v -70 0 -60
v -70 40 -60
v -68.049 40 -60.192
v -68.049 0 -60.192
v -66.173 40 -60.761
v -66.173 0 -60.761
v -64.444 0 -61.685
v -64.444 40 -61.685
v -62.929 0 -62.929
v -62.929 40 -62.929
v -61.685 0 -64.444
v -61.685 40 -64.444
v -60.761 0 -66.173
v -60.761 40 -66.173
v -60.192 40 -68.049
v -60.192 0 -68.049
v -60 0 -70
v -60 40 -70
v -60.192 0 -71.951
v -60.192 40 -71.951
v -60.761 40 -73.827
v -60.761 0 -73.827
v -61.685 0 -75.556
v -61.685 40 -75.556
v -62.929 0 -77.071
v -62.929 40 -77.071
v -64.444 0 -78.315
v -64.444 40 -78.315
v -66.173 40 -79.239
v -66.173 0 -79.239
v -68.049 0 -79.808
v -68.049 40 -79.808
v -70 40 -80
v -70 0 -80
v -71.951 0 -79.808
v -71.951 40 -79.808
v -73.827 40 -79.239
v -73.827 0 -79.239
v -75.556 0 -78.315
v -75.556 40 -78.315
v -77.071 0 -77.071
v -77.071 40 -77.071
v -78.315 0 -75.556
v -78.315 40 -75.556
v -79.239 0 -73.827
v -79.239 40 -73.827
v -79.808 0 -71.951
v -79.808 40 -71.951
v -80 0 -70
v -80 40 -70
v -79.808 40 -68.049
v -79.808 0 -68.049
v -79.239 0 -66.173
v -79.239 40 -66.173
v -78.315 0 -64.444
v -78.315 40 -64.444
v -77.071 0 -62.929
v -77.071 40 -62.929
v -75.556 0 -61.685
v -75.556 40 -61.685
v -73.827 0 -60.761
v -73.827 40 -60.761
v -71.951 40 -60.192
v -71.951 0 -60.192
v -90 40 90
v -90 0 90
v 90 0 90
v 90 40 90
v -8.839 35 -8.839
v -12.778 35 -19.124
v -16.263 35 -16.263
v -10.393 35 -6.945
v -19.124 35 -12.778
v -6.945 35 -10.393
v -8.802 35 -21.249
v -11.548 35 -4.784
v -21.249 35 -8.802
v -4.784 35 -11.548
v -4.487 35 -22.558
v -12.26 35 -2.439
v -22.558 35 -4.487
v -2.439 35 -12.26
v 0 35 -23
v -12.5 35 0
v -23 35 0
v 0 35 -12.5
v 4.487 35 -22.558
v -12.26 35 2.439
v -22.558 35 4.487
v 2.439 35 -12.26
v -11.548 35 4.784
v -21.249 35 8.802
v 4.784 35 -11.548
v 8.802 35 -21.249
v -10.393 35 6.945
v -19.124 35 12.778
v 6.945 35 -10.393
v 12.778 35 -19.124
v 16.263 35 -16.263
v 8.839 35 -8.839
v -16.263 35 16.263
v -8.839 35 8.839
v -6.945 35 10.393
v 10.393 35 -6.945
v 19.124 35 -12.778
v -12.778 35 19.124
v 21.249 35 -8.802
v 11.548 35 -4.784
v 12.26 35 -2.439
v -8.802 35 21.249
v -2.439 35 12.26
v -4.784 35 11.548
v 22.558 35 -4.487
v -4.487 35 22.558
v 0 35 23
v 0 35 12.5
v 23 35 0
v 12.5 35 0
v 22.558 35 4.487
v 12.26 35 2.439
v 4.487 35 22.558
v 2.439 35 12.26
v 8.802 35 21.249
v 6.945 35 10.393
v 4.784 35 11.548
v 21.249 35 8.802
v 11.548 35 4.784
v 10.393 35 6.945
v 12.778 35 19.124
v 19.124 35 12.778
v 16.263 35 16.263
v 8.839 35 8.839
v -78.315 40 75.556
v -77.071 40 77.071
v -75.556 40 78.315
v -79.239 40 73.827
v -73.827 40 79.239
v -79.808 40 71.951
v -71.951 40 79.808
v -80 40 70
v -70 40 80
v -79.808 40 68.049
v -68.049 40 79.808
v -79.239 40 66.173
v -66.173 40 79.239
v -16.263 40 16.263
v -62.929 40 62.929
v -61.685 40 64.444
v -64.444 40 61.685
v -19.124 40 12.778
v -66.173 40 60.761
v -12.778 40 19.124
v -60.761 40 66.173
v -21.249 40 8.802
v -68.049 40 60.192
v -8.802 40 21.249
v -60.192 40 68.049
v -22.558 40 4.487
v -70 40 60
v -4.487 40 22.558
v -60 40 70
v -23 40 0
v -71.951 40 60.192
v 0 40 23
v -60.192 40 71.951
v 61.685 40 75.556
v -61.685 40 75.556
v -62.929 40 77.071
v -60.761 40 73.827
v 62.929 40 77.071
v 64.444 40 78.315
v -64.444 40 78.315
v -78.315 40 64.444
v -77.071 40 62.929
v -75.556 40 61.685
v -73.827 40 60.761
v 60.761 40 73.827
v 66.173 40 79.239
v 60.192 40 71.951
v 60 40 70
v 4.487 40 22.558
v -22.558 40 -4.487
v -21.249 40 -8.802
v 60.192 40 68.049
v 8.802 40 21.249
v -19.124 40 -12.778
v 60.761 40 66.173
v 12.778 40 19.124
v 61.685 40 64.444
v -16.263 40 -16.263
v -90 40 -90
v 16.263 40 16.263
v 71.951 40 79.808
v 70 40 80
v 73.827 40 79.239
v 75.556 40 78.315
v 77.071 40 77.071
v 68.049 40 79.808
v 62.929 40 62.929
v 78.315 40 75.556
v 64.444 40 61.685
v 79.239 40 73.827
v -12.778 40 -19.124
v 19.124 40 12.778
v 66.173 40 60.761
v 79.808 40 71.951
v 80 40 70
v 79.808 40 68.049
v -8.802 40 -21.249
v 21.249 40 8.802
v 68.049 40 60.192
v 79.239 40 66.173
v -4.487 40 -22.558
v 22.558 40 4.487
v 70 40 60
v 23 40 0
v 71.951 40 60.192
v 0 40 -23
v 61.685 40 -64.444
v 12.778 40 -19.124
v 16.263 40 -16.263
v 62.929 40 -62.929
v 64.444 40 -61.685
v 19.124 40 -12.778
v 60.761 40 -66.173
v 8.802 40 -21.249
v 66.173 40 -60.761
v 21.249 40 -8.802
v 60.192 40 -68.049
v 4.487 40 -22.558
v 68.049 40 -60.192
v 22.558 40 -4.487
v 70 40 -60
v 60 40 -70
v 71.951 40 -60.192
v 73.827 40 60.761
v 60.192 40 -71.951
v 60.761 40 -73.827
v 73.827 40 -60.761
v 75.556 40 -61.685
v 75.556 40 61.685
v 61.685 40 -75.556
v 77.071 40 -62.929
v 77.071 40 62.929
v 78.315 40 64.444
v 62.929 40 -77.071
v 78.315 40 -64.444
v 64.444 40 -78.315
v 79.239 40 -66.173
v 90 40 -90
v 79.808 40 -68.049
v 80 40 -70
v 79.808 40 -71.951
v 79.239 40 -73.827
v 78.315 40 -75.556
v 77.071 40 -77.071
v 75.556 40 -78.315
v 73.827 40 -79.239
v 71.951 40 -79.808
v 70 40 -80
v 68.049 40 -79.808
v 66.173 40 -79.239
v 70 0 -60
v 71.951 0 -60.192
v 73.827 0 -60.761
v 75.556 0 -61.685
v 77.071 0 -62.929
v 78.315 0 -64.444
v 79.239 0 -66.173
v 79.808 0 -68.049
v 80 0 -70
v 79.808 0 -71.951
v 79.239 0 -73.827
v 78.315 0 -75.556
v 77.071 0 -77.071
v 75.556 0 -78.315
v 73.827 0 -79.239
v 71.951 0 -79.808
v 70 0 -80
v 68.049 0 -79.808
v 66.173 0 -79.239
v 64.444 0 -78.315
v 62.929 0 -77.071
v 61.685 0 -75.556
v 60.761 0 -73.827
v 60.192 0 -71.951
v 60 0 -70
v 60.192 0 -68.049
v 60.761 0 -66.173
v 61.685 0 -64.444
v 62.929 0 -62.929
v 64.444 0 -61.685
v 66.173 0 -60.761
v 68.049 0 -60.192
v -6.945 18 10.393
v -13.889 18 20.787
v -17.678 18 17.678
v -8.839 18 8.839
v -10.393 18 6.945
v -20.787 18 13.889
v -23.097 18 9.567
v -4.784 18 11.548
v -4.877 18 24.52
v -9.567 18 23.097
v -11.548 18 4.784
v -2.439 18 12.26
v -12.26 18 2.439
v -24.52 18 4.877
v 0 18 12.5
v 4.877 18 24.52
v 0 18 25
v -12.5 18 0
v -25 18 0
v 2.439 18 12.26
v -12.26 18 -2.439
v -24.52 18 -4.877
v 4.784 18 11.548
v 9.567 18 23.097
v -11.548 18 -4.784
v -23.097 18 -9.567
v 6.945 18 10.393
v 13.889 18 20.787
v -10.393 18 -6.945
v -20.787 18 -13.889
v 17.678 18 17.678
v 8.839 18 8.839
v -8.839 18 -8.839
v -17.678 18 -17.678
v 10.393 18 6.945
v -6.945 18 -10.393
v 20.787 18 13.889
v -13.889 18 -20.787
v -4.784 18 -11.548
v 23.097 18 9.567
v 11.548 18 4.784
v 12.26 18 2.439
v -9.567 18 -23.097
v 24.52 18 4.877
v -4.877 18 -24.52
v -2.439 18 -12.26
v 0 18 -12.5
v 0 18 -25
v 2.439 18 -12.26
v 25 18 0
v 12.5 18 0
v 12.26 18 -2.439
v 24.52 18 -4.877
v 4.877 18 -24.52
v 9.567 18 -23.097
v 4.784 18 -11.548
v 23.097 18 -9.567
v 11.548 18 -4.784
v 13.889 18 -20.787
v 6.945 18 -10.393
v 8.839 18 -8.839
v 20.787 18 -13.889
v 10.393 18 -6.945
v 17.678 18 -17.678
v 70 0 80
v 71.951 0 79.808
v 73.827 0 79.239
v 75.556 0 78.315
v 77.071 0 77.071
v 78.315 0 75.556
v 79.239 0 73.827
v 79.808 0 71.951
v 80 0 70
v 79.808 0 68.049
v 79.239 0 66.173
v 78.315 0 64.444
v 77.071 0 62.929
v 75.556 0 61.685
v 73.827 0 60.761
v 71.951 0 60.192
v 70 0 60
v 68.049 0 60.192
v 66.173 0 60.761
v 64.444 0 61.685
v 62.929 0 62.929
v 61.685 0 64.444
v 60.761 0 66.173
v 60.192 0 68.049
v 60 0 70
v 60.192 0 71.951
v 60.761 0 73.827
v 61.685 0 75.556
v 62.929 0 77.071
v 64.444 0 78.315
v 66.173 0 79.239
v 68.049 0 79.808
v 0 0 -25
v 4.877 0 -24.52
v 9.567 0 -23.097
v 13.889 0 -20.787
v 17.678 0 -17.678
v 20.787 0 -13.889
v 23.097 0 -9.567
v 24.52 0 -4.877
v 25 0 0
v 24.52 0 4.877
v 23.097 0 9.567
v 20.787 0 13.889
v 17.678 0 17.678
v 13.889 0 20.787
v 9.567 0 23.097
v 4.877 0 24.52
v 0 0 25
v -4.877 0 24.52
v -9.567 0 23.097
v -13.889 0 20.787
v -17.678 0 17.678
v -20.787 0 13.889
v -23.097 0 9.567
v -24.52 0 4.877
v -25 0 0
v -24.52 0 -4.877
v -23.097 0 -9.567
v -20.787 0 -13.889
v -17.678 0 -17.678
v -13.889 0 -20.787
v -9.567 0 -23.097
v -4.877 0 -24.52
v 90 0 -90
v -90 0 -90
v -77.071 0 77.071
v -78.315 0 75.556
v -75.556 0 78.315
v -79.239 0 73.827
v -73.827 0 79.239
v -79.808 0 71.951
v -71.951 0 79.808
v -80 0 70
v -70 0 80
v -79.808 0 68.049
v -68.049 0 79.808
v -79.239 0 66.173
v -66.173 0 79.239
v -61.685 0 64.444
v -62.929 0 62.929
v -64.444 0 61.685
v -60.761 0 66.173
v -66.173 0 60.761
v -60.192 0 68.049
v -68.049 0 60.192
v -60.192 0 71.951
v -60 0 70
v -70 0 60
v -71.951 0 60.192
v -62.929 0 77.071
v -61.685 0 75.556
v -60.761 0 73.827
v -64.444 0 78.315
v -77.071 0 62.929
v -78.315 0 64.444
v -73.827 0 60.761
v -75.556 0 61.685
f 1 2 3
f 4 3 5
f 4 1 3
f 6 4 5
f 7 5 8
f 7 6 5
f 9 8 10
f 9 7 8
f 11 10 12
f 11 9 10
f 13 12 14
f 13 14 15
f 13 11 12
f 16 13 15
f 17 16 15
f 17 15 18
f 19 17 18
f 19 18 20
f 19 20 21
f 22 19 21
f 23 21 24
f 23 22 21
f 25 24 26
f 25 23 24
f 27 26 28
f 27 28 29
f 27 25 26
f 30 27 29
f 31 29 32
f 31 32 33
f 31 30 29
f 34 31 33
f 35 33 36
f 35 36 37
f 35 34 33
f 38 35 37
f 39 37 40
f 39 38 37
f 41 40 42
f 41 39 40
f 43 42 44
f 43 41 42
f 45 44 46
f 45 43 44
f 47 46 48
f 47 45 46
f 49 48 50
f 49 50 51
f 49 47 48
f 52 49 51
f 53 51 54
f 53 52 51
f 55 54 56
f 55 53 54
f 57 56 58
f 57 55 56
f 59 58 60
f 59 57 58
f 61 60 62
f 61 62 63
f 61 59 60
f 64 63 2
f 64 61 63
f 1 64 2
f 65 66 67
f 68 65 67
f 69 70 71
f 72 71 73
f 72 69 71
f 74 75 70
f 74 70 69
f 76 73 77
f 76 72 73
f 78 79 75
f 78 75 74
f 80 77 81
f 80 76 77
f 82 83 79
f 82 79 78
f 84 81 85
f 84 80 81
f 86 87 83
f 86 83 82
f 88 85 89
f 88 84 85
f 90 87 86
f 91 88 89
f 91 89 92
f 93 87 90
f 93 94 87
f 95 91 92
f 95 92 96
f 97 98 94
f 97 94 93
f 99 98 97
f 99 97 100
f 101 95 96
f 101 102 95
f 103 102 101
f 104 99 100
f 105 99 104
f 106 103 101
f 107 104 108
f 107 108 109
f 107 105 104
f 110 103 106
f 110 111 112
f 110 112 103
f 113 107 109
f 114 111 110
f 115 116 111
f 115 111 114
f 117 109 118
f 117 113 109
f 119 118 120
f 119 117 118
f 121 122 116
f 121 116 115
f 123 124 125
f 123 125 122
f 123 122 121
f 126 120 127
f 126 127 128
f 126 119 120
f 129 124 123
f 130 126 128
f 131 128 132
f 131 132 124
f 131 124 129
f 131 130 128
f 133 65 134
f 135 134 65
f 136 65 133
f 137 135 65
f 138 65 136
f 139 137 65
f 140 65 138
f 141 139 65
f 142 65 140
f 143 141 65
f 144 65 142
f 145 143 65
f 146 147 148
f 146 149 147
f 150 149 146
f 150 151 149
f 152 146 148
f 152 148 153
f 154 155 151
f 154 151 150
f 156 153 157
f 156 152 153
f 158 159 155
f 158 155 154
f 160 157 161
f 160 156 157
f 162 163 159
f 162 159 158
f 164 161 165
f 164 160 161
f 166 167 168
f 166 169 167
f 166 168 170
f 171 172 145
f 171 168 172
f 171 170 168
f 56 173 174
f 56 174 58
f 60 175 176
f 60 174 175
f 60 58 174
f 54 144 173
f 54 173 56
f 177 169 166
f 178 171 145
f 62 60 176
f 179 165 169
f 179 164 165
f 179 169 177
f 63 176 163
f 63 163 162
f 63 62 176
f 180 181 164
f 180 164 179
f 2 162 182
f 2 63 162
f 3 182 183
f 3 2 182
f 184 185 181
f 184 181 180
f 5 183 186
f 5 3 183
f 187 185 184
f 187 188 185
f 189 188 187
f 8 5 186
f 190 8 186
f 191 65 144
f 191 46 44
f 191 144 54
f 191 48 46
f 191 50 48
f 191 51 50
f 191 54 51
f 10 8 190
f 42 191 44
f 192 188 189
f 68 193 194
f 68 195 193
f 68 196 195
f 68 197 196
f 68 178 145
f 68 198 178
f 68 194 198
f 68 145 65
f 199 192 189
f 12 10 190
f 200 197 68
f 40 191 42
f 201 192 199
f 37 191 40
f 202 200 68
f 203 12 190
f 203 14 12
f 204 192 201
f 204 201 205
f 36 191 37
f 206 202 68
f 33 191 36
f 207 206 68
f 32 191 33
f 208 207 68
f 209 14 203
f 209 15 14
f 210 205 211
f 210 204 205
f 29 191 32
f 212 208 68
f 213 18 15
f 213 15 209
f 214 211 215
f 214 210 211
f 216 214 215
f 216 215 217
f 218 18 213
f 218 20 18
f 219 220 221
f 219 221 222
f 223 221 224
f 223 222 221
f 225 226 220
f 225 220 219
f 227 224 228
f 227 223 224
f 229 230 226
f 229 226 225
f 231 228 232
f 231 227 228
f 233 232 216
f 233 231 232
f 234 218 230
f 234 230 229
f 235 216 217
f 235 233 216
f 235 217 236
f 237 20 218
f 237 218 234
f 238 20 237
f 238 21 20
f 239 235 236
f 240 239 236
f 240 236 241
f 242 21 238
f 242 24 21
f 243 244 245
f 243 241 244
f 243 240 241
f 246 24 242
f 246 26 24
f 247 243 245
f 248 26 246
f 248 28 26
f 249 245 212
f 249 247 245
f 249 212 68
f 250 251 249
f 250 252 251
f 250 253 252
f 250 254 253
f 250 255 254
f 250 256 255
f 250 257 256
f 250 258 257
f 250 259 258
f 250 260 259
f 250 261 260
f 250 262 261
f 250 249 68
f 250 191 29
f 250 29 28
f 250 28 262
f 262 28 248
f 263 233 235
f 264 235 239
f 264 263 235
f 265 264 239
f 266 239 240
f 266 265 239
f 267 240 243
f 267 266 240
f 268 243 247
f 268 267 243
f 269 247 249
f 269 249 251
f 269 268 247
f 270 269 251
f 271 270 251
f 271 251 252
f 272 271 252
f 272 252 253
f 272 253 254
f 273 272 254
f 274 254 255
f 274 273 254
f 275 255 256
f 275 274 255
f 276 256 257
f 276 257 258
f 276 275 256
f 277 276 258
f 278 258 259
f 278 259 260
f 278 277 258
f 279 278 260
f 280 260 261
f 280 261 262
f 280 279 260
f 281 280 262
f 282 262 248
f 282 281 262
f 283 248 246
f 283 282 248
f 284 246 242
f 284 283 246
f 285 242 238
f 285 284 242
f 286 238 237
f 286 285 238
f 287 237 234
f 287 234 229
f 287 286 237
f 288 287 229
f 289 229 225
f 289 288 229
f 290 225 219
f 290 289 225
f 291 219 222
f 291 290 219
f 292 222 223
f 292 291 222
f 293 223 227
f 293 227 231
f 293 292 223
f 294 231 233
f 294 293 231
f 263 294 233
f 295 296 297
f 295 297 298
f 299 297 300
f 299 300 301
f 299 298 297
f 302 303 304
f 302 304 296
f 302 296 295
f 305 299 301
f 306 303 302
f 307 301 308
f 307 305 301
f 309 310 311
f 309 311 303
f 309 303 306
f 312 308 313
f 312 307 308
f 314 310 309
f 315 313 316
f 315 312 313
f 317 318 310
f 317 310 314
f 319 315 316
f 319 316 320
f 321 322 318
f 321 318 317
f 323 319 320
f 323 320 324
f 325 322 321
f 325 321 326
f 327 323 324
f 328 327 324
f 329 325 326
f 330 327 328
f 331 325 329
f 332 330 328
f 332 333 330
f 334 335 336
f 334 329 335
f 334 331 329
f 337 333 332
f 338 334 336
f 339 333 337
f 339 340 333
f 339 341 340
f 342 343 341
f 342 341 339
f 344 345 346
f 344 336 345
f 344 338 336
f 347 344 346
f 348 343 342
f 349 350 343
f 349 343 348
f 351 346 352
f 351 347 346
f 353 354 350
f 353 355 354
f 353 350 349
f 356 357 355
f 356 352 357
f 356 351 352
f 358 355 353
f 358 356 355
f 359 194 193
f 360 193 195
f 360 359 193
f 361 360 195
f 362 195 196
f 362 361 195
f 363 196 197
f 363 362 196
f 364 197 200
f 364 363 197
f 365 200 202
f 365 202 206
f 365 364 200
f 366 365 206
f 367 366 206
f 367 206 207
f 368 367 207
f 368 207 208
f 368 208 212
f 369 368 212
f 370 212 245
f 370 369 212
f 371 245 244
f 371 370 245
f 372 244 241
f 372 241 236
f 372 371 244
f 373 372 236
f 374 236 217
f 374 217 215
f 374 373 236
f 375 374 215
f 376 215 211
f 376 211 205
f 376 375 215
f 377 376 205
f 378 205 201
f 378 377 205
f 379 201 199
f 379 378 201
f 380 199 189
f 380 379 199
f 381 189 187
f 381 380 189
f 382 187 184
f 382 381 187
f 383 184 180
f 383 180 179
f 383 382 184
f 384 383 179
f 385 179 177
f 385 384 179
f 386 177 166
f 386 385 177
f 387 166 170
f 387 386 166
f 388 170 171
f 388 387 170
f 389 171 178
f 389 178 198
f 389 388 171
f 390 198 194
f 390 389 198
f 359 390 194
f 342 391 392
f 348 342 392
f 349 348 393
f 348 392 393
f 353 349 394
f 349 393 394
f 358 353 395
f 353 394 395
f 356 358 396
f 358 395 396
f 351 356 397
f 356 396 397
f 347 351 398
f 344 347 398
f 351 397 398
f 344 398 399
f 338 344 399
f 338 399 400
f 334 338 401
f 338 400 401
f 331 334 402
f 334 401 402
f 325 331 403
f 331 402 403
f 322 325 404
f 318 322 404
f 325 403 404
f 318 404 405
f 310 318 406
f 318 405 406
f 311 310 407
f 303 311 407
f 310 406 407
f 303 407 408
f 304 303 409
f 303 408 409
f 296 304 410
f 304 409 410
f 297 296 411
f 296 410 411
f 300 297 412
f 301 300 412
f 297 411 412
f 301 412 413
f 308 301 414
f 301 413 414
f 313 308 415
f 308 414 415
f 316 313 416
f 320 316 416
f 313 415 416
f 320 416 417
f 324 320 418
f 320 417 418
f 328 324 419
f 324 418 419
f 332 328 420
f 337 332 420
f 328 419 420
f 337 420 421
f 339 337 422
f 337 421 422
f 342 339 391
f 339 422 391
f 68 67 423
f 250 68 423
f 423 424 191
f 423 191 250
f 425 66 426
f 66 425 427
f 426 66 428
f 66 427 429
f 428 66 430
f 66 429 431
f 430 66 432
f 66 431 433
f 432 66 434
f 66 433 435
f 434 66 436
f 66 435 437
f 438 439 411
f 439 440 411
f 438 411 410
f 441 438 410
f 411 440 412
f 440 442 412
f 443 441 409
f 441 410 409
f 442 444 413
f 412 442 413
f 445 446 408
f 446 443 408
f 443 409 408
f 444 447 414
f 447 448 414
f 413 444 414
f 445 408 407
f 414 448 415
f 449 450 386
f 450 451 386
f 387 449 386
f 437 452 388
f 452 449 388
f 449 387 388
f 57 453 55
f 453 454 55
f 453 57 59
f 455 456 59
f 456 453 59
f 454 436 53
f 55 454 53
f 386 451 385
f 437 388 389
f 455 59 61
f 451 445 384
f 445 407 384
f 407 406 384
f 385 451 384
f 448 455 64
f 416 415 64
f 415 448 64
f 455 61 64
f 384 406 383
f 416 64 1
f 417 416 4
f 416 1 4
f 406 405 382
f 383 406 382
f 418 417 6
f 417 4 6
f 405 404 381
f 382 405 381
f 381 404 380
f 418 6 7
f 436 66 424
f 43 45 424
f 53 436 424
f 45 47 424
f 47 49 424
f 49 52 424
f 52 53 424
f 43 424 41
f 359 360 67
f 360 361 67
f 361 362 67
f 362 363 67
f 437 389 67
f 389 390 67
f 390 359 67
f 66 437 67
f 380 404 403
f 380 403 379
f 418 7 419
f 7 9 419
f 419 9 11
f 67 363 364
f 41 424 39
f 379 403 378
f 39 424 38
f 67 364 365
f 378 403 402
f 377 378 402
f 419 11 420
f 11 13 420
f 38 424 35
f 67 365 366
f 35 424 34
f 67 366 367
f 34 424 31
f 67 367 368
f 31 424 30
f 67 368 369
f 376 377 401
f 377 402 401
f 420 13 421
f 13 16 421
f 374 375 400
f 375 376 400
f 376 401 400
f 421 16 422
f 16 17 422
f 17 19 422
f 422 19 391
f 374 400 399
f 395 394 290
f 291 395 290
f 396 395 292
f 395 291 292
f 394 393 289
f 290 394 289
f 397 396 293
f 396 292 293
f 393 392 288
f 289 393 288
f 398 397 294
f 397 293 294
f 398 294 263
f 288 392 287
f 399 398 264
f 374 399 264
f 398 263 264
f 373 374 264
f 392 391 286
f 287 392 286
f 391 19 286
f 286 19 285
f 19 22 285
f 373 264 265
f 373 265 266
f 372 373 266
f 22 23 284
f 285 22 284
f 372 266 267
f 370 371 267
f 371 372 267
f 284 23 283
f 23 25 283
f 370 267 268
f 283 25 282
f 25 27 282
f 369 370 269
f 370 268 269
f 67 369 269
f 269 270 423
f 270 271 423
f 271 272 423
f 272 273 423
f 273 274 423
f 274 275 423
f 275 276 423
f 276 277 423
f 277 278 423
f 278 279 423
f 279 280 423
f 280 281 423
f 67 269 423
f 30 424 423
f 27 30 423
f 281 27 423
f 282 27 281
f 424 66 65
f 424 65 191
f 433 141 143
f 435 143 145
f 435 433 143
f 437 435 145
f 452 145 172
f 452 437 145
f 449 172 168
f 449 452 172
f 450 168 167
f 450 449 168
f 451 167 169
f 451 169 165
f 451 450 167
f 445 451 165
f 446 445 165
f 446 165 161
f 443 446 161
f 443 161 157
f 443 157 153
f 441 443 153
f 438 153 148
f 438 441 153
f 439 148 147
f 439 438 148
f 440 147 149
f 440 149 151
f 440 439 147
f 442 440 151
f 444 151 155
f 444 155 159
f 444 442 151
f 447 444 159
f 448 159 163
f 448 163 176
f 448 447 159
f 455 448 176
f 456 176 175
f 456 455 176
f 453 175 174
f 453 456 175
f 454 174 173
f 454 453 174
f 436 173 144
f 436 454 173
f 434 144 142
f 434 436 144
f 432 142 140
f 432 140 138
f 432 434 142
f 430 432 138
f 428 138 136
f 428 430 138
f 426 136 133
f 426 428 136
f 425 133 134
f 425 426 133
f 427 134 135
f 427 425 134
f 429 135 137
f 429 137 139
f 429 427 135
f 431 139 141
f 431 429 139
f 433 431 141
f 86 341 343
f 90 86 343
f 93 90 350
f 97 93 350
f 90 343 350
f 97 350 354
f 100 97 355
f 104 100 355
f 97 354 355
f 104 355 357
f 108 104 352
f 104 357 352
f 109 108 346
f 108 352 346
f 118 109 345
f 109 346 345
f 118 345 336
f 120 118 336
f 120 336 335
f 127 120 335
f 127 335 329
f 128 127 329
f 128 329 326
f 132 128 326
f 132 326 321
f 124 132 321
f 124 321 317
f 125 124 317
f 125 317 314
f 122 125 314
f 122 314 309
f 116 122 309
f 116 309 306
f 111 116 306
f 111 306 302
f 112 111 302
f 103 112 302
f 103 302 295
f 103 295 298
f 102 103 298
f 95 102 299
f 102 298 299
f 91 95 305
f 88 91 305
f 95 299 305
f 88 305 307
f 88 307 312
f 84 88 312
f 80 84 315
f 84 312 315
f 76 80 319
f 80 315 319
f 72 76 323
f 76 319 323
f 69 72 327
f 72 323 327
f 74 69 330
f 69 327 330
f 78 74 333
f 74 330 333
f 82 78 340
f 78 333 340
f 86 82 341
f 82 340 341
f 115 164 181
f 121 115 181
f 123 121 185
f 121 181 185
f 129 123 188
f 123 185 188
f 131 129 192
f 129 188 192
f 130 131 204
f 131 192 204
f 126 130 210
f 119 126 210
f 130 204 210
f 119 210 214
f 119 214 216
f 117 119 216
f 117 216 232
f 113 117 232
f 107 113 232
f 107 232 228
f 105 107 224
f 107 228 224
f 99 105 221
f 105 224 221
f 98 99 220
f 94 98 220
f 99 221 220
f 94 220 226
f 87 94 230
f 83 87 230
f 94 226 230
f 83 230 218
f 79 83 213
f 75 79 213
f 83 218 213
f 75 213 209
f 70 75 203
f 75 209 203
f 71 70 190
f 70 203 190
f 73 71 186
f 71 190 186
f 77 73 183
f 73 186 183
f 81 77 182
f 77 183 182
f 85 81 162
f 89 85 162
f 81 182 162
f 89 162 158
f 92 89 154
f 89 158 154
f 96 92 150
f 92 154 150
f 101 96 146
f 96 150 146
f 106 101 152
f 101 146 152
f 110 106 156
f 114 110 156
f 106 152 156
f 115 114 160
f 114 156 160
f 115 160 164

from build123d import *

# Parameters (mm, degrees)
SKETCH1_W           = 180
SKETCH1_H           = 180
SKETCH1_R           = 10
BOSS_EXTRUDE1_DEPTH = 40
SKETCH2_R           = 23
CUT_EXTRUDE1_DEPTH  = 5
SKETCH3_R           = 25
CUT_EXTRUDE2_DEPTH  = 18
SKETCH4_R           = 12.5
CUT_EXTRUDE3_DEPTH  = 18


with BuildPart() as part:
    # Sketch1 → Boss-Extrude1 (new body)
    with BuildSketch(Plane(origin=(0, 0, 0), x_dir=(1, 0, 0), z_dir=(0, 1, 0))):
        Rectangle(SKETCH1_W, SKETCH1_H)
        with Locations(Location((-70, 70, 0), (0, 0, 270))):
            Circle(SKETCH1_R, mode=Mode.SUBTRACT)
        with Locations(Location((70, 70, 0), (0, 0, 270))):
            Circle(SKETCH1_R, mode=Mode.SUBTRACT)
        with Locations(Location((-70, -70, 0), (0, 0, 270))):
            Circle(SKETCH1_R, mode=Mode.SUBTRACT)
        with Locations(Location((70, -70, 0), (0, 0, 270))):
            Circle(SKETCH1_R, mode=Mode.SUBTRACT)
    extrude(amount=BOSS_EXTRUDE1_DEPTH)

    # Sketch2 → Cut-Extrude1 (cut)
    with BuildSketch(Plane(origin=(0, 40, 0), x_dir=(1, 0, 0), z_dir=(0, 1, 0))):
        with Locations(Location((0, 0, 0), (0, 0, 270))):
            Circle(SKETCH2_R)
    extrude(amount=-CUT_EXTRUDE1_DEPTH, mode=Mode.SUBTRACT)

    # Sketch3 → Cut-Extrude2 (cut)
    with BuildSketch(Plane.XZ):
        with Locations(Location((0, 0, 0), (0, 0, 270))):
            Circle(SKETCH3_R)
    extrude(amount=-CUT_EXTRUDE2_DEPTH, mode=Mode.SUBTRACT)

    # Sketch4 → Cut-Extrude3 (cut)
    with BuildSketch(Plane.XZ.offset(-18)):
        with Locations(Location((0, 0, 0), (0, 0, 270))):
            Circle(SKETCH4_R)
    extrude(amount=-CUT_EXTRUDE3_DEPTH, mode=Mode.SUBTRACT)


solid = part.part
